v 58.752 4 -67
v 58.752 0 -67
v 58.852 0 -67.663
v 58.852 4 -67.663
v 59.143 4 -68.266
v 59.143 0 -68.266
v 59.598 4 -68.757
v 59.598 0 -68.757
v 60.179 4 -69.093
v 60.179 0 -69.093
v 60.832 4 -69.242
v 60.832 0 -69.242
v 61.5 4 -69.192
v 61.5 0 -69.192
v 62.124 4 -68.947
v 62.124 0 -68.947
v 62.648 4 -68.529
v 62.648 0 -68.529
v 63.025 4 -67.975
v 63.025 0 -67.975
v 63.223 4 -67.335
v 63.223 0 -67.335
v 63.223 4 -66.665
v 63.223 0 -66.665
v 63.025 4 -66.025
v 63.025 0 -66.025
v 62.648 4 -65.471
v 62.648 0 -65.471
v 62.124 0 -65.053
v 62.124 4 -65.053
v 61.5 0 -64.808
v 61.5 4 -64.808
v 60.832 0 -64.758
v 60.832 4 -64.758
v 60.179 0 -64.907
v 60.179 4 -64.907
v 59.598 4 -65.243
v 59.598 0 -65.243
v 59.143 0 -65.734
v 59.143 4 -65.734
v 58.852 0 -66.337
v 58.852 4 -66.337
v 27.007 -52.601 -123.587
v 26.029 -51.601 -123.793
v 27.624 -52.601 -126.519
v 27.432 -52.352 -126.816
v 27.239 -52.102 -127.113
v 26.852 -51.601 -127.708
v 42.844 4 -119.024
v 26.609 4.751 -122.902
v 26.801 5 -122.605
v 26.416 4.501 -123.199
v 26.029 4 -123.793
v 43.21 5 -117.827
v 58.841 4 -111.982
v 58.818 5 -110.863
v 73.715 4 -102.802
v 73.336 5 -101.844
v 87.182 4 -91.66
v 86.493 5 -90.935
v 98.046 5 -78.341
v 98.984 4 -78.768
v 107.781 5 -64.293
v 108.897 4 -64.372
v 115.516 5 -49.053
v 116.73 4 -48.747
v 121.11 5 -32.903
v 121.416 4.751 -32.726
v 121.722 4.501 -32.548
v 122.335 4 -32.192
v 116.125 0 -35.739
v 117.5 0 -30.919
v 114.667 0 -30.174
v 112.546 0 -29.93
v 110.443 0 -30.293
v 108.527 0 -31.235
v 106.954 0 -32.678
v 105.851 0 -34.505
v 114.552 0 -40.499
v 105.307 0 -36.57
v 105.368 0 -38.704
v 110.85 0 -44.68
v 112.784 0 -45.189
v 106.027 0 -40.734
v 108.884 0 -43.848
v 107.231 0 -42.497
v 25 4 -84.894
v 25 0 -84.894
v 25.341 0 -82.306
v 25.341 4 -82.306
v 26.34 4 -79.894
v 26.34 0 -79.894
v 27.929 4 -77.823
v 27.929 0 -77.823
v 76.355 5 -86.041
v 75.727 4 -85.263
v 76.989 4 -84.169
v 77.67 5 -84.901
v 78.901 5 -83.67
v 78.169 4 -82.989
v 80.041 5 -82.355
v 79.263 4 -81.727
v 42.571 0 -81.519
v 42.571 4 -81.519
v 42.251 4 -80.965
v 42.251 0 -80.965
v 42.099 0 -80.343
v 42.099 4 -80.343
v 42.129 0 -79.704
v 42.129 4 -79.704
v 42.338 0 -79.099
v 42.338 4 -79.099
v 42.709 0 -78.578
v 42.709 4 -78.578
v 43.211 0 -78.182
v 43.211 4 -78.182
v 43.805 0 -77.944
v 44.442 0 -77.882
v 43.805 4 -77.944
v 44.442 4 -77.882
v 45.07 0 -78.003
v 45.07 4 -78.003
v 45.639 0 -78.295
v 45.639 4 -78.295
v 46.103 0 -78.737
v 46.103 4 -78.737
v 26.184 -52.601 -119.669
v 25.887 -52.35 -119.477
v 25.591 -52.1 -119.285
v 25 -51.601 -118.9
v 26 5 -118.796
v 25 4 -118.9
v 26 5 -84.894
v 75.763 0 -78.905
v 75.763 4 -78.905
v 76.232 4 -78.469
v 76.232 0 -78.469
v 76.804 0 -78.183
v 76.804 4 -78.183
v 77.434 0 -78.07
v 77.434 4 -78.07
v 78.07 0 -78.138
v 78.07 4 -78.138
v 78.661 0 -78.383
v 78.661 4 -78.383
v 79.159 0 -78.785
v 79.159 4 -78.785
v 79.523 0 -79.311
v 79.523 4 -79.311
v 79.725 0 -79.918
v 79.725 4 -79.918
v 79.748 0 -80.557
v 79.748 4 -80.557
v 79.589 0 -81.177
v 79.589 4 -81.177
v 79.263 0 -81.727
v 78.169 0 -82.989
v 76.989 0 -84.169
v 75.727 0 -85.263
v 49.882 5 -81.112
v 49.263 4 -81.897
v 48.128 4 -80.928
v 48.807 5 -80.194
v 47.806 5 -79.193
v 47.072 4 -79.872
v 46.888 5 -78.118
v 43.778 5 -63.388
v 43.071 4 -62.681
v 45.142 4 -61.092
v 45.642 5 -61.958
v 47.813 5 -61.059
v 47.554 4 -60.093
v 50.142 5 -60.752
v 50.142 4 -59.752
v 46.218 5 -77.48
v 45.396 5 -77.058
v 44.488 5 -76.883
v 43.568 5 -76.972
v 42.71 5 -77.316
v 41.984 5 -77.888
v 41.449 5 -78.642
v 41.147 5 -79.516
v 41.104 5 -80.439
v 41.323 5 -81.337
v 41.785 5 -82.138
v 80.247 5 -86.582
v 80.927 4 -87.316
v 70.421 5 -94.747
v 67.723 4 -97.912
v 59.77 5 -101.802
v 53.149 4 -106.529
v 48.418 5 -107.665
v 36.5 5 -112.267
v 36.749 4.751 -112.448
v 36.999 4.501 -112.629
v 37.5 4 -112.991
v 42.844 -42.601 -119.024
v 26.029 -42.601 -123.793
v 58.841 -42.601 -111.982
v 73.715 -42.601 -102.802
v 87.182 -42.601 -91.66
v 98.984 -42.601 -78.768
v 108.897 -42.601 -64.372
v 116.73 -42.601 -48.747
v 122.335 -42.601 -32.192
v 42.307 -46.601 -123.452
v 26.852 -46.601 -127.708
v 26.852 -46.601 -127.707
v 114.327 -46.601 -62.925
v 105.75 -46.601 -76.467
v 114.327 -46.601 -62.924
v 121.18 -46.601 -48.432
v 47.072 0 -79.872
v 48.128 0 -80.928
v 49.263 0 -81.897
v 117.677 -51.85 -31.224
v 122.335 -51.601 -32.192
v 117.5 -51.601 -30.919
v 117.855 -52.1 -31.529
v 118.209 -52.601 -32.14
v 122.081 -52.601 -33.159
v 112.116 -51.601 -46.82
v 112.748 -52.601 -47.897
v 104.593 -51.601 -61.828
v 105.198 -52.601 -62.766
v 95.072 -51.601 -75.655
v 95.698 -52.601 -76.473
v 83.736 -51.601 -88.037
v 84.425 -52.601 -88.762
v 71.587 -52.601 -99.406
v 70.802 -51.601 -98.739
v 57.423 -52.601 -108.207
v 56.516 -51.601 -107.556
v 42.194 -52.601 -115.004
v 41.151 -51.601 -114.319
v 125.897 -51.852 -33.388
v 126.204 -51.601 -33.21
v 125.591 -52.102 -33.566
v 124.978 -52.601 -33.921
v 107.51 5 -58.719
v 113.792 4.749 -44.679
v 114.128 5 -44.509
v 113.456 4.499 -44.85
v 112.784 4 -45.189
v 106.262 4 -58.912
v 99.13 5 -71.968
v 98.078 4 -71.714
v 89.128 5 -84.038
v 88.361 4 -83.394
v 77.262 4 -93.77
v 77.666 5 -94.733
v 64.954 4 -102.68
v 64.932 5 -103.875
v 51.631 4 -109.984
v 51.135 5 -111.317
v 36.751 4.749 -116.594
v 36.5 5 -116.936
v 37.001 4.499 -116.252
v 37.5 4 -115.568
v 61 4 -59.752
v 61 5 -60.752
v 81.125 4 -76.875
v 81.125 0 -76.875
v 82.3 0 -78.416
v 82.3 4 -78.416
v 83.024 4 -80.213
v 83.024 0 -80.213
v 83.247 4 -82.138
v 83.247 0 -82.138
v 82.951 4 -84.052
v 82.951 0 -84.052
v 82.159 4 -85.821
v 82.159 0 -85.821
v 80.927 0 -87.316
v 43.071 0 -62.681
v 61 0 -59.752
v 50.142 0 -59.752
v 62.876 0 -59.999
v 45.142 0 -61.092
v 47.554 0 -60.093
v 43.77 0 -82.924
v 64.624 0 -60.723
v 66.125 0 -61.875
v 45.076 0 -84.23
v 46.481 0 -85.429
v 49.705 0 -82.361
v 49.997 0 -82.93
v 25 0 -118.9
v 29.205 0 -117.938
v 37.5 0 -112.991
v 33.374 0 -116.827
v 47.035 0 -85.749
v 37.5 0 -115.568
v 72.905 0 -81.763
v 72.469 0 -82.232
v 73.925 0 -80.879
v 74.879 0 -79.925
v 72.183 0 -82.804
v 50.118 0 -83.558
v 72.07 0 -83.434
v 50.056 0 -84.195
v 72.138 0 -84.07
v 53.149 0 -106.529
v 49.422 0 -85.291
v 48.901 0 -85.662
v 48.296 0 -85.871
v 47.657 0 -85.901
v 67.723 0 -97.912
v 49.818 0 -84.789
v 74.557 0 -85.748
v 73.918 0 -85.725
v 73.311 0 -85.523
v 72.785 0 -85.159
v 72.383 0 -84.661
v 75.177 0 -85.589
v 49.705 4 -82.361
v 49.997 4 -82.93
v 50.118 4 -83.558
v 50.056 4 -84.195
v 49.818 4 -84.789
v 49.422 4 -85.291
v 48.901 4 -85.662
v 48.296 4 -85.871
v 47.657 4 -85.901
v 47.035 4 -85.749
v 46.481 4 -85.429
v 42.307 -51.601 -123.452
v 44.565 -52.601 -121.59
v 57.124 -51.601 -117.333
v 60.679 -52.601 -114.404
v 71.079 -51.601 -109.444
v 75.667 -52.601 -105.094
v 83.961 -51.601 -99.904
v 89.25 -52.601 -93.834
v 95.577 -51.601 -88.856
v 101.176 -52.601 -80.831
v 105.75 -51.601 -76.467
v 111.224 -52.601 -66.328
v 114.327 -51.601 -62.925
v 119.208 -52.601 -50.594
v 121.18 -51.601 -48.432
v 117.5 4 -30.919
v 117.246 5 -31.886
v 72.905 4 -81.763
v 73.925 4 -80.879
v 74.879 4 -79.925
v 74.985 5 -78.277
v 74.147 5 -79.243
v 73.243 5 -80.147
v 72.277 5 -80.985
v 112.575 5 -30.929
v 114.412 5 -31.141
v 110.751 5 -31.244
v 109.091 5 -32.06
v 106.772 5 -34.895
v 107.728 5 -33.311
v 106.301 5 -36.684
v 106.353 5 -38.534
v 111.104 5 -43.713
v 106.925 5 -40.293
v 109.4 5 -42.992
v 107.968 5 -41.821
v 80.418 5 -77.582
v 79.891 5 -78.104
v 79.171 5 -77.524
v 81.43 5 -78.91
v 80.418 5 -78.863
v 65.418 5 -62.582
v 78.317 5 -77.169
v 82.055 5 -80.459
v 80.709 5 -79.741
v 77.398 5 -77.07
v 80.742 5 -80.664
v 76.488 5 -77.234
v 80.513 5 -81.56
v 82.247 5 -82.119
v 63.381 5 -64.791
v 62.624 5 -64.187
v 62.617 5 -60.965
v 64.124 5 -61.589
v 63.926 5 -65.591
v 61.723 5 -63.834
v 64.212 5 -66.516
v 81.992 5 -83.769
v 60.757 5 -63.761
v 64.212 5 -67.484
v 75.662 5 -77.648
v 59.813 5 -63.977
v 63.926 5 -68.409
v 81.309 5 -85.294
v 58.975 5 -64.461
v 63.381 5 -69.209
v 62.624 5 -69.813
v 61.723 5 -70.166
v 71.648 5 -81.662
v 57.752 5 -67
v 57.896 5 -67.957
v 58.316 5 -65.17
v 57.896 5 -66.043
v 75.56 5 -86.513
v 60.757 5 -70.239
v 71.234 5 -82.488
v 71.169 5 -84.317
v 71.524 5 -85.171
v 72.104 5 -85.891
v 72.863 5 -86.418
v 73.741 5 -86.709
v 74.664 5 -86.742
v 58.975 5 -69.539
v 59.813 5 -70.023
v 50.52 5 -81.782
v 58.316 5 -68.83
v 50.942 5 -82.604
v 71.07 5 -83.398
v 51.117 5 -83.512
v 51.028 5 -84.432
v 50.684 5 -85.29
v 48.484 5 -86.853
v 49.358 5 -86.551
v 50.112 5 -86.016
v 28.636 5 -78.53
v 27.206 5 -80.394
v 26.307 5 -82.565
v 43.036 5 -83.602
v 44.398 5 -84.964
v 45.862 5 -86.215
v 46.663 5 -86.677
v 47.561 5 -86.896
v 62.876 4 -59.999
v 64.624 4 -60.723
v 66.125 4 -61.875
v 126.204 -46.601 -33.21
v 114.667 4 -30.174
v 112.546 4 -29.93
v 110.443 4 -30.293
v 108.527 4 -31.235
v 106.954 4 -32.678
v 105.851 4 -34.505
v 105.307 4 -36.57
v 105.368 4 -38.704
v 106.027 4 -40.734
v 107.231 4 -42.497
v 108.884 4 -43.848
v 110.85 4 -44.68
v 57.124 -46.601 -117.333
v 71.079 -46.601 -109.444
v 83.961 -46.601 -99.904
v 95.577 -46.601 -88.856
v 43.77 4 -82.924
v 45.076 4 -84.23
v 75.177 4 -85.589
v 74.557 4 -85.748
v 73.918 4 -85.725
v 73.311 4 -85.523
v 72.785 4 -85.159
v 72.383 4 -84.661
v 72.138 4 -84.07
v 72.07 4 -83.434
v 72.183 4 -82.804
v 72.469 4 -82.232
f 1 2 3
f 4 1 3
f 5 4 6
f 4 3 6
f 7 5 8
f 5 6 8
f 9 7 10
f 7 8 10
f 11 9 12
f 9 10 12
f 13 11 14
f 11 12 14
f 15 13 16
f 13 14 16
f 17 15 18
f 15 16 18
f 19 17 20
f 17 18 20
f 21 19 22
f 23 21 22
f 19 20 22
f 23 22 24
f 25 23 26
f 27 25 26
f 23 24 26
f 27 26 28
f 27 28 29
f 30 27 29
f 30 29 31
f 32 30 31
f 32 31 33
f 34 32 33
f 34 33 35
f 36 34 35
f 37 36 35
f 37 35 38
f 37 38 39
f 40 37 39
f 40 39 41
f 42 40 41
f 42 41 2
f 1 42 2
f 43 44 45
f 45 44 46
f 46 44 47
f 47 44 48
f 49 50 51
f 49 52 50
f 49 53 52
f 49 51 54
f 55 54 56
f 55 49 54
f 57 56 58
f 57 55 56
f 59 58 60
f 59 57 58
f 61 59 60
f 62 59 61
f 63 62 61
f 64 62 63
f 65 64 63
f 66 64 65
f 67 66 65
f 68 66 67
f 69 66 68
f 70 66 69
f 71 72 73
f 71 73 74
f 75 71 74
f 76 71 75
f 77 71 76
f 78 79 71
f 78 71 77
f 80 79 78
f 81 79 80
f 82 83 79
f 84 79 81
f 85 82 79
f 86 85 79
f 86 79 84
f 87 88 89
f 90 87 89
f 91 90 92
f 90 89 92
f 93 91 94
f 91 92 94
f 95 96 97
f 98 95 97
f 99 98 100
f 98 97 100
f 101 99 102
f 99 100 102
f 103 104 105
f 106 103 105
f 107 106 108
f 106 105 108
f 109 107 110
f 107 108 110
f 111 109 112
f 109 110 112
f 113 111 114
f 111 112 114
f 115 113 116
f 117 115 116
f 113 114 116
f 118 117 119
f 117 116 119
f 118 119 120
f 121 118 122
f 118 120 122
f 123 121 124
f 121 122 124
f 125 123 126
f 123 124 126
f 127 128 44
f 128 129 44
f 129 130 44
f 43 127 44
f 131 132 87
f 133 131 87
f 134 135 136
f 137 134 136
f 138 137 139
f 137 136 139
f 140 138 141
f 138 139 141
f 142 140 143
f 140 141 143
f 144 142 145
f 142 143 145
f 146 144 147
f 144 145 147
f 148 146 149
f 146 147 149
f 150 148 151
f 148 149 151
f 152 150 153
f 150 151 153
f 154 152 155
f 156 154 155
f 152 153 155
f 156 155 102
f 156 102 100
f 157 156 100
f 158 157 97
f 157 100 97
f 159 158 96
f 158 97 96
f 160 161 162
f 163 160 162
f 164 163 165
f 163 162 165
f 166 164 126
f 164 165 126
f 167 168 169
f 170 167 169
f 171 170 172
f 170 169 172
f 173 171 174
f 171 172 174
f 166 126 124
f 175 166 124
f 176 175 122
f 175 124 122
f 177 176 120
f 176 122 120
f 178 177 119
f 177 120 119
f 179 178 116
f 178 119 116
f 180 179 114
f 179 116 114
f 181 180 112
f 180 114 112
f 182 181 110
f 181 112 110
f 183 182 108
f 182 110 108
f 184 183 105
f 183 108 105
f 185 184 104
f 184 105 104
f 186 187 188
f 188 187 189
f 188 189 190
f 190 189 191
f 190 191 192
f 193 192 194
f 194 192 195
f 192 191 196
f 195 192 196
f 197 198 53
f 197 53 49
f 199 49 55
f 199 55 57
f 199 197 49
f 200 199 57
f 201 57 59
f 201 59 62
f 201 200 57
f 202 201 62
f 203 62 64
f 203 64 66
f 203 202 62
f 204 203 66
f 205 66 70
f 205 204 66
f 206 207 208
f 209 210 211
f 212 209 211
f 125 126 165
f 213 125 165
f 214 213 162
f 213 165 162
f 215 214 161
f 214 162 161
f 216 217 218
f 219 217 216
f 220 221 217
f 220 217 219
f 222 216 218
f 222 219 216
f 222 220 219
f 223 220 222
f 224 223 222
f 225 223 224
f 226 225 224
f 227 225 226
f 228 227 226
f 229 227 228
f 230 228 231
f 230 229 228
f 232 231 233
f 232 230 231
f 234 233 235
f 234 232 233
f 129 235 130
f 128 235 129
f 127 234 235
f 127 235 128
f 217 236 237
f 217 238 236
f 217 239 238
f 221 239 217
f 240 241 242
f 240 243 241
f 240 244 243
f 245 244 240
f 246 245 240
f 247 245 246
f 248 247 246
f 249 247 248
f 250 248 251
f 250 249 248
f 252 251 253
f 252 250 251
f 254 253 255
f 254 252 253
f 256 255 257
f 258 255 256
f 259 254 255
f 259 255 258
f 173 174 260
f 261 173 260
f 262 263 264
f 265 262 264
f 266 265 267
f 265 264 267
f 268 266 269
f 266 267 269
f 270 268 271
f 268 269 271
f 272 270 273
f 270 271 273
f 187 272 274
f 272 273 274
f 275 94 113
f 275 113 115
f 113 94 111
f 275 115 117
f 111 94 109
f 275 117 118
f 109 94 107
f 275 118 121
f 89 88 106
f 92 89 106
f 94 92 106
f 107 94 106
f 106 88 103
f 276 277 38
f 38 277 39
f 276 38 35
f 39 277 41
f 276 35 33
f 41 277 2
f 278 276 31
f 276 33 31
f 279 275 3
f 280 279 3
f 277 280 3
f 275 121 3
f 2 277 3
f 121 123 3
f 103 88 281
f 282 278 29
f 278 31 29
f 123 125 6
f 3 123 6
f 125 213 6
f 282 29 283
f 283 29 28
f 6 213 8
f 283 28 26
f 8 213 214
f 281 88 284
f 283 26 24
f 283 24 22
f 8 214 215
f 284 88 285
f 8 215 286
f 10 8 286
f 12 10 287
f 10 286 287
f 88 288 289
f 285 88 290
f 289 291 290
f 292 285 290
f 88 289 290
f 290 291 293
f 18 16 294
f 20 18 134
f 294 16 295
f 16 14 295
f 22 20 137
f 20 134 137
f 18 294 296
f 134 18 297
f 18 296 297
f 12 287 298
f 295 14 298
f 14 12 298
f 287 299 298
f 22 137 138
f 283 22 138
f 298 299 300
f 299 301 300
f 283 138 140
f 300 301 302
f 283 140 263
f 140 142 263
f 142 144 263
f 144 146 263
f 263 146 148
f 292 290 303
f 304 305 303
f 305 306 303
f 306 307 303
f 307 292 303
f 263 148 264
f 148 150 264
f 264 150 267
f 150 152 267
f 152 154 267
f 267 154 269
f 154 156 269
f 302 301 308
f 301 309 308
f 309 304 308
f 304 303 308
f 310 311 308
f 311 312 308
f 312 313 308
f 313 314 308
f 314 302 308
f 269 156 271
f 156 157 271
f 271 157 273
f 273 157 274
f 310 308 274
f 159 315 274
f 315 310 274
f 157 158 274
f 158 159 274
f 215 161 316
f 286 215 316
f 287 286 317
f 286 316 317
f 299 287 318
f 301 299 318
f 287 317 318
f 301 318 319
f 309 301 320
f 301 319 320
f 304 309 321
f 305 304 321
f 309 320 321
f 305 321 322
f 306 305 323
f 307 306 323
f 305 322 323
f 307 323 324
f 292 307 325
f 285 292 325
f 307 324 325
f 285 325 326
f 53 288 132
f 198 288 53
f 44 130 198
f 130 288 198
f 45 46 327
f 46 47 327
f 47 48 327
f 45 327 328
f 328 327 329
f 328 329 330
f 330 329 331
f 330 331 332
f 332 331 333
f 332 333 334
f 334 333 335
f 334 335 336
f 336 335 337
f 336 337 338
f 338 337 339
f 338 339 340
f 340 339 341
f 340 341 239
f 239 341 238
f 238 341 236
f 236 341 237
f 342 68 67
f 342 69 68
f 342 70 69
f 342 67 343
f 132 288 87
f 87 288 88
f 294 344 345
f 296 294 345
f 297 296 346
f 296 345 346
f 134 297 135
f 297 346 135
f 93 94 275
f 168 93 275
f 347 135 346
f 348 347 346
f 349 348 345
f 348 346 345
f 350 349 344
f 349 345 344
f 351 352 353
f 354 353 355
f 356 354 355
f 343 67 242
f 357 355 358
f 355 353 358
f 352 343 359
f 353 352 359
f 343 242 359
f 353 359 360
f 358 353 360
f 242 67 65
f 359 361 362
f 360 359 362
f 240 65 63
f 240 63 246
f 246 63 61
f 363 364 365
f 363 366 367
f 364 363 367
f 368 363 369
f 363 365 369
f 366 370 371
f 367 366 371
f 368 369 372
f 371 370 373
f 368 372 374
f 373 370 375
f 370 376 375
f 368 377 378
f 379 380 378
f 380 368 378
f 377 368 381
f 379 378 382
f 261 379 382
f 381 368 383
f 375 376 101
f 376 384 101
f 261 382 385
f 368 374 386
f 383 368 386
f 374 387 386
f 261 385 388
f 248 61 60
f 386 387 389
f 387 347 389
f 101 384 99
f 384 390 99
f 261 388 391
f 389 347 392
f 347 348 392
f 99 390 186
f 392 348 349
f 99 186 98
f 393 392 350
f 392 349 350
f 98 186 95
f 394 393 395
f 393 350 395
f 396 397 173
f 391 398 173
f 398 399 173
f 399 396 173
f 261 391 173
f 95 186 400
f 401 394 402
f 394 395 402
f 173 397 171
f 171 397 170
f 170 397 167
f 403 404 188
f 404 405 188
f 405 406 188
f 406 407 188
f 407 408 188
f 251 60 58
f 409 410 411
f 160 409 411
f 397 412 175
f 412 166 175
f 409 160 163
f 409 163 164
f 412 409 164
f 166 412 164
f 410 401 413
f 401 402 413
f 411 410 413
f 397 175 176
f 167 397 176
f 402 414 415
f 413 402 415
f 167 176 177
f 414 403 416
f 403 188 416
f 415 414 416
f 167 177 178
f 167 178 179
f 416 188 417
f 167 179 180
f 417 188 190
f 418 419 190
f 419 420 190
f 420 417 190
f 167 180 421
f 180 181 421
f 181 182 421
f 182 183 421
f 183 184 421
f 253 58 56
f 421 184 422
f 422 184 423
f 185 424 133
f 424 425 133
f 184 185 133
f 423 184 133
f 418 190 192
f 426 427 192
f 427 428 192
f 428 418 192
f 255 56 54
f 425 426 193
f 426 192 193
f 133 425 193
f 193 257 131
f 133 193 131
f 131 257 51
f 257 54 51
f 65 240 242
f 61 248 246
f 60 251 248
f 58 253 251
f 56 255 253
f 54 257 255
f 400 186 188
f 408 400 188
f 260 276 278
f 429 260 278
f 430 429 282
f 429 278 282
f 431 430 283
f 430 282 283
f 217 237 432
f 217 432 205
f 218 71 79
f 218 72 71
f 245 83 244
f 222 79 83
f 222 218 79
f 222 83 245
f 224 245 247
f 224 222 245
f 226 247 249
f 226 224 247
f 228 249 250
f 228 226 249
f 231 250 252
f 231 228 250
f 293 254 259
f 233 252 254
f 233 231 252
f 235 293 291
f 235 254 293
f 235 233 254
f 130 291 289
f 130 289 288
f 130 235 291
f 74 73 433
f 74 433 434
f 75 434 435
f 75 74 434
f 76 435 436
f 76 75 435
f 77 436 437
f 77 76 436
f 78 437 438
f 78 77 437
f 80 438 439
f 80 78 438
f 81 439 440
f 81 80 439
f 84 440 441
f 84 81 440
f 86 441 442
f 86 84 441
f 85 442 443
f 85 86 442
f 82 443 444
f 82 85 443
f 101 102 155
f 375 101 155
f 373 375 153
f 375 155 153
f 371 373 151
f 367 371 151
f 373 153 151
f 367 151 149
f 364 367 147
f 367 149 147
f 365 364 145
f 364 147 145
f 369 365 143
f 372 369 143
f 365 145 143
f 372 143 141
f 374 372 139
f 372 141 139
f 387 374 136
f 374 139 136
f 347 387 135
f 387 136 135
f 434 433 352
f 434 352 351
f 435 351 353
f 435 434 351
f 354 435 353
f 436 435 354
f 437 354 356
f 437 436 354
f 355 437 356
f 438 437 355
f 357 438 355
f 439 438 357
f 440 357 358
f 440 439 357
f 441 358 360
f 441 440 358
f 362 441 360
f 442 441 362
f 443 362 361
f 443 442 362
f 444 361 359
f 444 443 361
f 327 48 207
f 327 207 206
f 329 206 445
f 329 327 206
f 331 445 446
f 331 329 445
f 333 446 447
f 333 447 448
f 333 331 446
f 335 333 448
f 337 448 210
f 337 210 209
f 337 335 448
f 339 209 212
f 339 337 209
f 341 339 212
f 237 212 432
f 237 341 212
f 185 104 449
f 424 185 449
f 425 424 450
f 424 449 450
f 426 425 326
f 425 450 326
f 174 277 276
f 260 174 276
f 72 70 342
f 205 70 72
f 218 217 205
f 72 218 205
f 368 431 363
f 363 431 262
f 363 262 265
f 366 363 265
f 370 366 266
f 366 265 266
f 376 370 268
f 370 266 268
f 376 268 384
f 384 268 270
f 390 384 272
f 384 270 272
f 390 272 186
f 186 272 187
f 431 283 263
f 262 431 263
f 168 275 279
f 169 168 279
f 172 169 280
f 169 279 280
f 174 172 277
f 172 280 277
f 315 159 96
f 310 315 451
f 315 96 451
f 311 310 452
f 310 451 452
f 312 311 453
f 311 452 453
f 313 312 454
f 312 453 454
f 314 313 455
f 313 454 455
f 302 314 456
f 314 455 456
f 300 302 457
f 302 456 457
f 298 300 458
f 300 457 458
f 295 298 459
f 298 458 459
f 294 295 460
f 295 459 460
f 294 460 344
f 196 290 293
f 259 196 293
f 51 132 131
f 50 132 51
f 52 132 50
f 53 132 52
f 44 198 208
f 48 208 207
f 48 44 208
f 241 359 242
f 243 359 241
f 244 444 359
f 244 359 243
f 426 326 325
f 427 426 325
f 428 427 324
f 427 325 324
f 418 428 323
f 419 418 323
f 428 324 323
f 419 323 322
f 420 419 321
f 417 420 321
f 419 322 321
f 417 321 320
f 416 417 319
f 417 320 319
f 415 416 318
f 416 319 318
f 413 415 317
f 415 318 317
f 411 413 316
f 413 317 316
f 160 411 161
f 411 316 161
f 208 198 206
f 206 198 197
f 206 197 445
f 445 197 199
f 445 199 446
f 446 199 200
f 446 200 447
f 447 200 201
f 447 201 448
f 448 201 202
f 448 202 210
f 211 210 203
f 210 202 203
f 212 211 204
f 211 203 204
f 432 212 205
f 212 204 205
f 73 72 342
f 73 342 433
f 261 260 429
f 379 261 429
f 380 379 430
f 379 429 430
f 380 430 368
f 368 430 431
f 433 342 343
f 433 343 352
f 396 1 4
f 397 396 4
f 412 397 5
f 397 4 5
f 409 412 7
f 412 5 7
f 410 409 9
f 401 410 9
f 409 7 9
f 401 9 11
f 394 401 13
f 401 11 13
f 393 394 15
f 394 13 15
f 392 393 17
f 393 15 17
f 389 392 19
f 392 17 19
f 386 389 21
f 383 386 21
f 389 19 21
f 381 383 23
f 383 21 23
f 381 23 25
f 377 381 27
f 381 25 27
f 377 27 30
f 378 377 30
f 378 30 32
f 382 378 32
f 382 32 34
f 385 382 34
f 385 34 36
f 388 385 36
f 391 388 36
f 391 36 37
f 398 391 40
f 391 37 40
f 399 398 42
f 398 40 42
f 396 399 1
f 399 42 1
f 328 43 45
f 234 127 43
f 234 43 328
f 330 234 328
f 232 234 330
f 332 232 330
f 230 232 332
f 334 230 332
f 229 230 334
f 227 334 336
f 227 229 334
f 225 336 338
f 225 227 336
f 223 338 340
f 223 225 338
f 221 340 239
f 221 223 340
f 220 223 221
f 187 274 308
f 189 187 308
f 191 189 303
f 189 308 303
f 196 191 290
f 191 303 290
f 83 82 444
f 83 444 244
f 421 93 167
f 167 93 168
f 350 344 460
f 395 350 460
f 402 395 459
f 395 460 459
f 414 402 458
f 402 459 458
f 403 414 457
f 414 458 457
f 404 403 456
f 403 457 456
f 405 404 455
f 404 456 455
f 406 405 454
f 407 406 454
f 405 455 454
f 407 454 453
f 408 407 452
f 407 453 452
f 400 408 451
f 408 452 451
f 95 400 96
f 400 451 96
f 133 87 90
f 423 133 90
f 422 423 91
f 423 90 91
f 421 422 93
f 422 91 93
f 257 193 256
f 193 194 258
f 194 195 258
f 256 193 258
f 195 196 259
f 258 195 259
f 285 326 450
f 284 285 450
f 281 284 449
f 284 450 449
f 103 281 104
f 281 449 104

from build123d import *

# Parameters (mm, degrees)
BOSS_EXTRUDE1_DEPTH      = 5
BOSS_EXTRUDE1_DEPTH_BACK = 52.601
BOSS_EXTRUDE2_DEPTH      = 5
SKETCH3_W                = 4
SKETCH3_H                = 6
F_8_CLEARANCE_HOLE1_D    = 4.4958
CHAMFER1_SIZE            = 4
CUT_EXTRUDE7_DEPTH       = 189.558951211
BOSS_EXTRUDE10_START     = -5
BOSS_EXTRUDE10_DEPTH     = 5
CHAMFER4_SIZE            = 1


with BuildPart() as part:
    # Sketch1 → Boss-Extrude1 (new, two sides: drawn at the far end of the back side and taken through both)
    with BuildSketch(Plane(origin=(0, 0, 0), x_dir=(1, 0, 0), z_dir=(0, 1, 0)).offset(-BOSS_EXTRUDE1_DEPTH_BACK)):
        with BuildLine():
            Line((122.335390947, 32.191646773), (117.5, 30.919249667))
            ThreePointArc((117.5, 30.919249667), (83.736031712, 88.037077377), (25, 118.900168208))
            Line((25, 118.900168208), (26.028806584, 123.793179246))
            ThreePointArc((26.028806584, 123.793179246), (87.181958943, 91.660002372), (122.335390947, 32.191646773))
        make_face()
    extrude(amount=BOSS_EXTRUDE1_DEPTH + BOSS_EXTRUDE1_DEPTH_BACK)

    # Sketch2 → Boss-Extrude2 (add)
    with BuildSketch(Plane(origin=(0, 0, 0), x_dir=(1, 0, 0), z_dir=(0, 1, 0))):
        with BuildLine():
            Line((25, 118.900168208), (25, 84.894235624))
            ThreePointArc((25, 84.894235624), (25.761204675, 81.0674013), (27.928932188, 77.823167812))
            Line((27.928932188, 77.823167812), (43.071067812, 62.681032188))
            ThreePointArc((43.071067812, 62.681032188), (46.3153013, 60.513304675), (50.142135624, 59.7521))
            Line((50.142135624, 59.7521), (61, 59.7521))
            ThreePointArc((61, 59.7521), (63.773651249, 60.303813536), (66.125039239, 61.874960761))
            Line((66.125039239, 61.874960761), (81.125039239, 76.874960761))
            ThreePointArc((81.125039239, 76.874960761), (83.24659479, 82.137544003), (80.926866317, 87.315829447))
            ThreePointArc((80.926866317, 87.315829447), (60.589058557, 102.480133426), (37.5, 112.990980896))
            Line((37.5, 112.990980896), (37.5, 115.568161706))
            ThreePointArc((37.5, 115.568161706), (31.294377559, 117.400647073), (25, 118.900168208))
        make_face()
    extrude(amount=BOSS_EXTRUDE2_DEPTH)

    # Sweep1: sweep along a path in Sketch5
    with BuildLine(Plane.XZ.offset(52.601)) as sweep1_path:
        ThreePointArc((26.028806584, -123.793179246), (87.181958943, -91.660002372), (122.335390947, -32.191646773))
    # Sketch3 → Sweep1 (sweep)
    with BuildSketch(Plane(origin=(0, 0, 0), x_dir=(-0.20576131687242788, 0, 0.9786022074770342), z_dir=(-0.9786022074770342, 0, -0.20576131687242788))):
        with Locations((-128.5, -49.601)):
            Rectangle(SKETCH3_W, SKETCH3_H)
    sweep(path=sweep1_path.line)

    # #8 Clearance Hole1 (through all)
    with Locations(Plane(origin=(0, 5, 0), x_dir=(1, 0, 0), z_dir=(0, 1, 0))):
        with Locations((61, 67), (46, 52), (76, 52), (46, 82), (76, 82)):
            Hole(F_8_CLEARANCE_HOLE1_D / 2)

    # Chamfer1
    chamfer1_edges = [part.edges().sort_by_distance(p)[0] for p in [
        (87.181958943, -46.601, -91.660002372),
    ]]
    chamfer(chamfer1_edges, length=CHAMFER1_SIZE - 0.0001)  # a hair under: the kernel refuses the full size

    # Sketch21 → Cut-Extrude7 (cut, through all)
    with BuildSketch(Plane(origin=(0, 5, 0), x_dir=(1, 0, 0), z_dir=(0, 1, 0))):
        with BuildLine():
            ThreePointArc((46.481194337, 85.428989569), (44.410494667, 83.589505333), (42.571010431, 81.518805663))
            ThreePointArc((42.571010431, 81.518805663), (42.945660431, 78.361948651), (46.102517444, 78.736598651))
            ThreePointArc((46.102517444, 78.736598651), (47.589505333, 80.410494667), (49.263401349, 81.897482556))
            ThreePointArc((49.263401349, 81.897482556), (49.638051349, 85.054339569), (46.481194337, 85.428989569))
        make_face()
        with BuildLine():
            ThreePointArc((79.262817338, 81.727283432), (77.589505333, 83.589505333), (75.727283432, 85.262817338))
            ThreePointArc((75.727283432, 85.262817338), (72.566372961, 84.924064019), (72.90512628, 81.763153547))
            ThreePointArc((72.90512628, 81.763153547), (74.410494667, 80.410494667), (75.763153547, 78.90512628))
            ThreePointArc((75.763153547, 78.90512628), (78.924064019, 78.566372961), (79.262817338, 81.727283432))
        make_face()
    extrude(amount=-CUT_EXTRUDE7_DEPTH, mode=Mode.SUBTRACT)

    # Sketch32 → Boss-Extrude10 (add)
    with BuildSketch(Plane(origin=(0, 5, 0), x_dir=(1, 0, 0), z_dir=(0, 1, 0)).offset(BOSS_EXTRUDE10_START)):
        with BuildLine():
            Line((117.5, 30.919249667), (114.666962611, 30.173756984))
            ThreePointArc((114.666962611, 30.173756984), (105.505280532, 35.518247745), (110.849771294, 44.679929823))
            Line((110.849771294, 44.679929823), (112.783927672, 45.188888665))
            ThreePointArc((112.783927672, 45.188888665), (115.362808068, 38.127057514), (117.5, 30.919249667))
        make_face()
    extrude(amount=BOSS_EXTRUDE10_DEPTH)

    # Chamfer4
    chamfer4_edges = [part.edges().sort_by_distance(p)[0] for p in [
        (87.181958943, 5, -91.660002372),
        (44.410494667, 5, -83.589505333),
        (47.589505333, 5, -80.410494667),
        (49.638051349, 5, -85.054339569),
        (42.945660431, 5, -78.361948651),
        (74.410494667, 5, -80.410494667),
        (77.589505333, 5, -83.589505333),
        (121.851851852, -52.601, -32.064407063),
        (72.566372961, 5, -84.924064019),
        (78.924064019, 5, -78.566372961),
        (25.925925926, -52.601, -123.303878142),
        (83.736031712, -52.601, -88.037077377),
        (25.514403292, 5, -121.346673727),
        (111.816849483, 5, -44.934409244),
        (105.505280532, 5, -35.518247745),
        (82.973641884, 5, -88.755984319),
        (37.5, 5, -114.279571301),
        (25, 5, -101.897201916),
        (25.761204675, 5, -81.0674013),
        (35.5, 5, -70.2521),
        (46.3153013, 5, -60.513304675),
        (55.571067812, 5, -59.7521),
        (63.773651249, 5, -60.303813536),
        (73.625039239, 5, -69.374960761),
        (83.24659479, 5, -82.137544003),
        (60.589058557, 5, -102.480133426),
        (89.938700727, -52.601, -94.558342368),
        (118.501176779, 5, -31.182701878),
        (63.2479, 5, -67),
    ]]
    chamfer(chamfer4_edges, length=CHAMFER4_SIZE)


solid = part.part
